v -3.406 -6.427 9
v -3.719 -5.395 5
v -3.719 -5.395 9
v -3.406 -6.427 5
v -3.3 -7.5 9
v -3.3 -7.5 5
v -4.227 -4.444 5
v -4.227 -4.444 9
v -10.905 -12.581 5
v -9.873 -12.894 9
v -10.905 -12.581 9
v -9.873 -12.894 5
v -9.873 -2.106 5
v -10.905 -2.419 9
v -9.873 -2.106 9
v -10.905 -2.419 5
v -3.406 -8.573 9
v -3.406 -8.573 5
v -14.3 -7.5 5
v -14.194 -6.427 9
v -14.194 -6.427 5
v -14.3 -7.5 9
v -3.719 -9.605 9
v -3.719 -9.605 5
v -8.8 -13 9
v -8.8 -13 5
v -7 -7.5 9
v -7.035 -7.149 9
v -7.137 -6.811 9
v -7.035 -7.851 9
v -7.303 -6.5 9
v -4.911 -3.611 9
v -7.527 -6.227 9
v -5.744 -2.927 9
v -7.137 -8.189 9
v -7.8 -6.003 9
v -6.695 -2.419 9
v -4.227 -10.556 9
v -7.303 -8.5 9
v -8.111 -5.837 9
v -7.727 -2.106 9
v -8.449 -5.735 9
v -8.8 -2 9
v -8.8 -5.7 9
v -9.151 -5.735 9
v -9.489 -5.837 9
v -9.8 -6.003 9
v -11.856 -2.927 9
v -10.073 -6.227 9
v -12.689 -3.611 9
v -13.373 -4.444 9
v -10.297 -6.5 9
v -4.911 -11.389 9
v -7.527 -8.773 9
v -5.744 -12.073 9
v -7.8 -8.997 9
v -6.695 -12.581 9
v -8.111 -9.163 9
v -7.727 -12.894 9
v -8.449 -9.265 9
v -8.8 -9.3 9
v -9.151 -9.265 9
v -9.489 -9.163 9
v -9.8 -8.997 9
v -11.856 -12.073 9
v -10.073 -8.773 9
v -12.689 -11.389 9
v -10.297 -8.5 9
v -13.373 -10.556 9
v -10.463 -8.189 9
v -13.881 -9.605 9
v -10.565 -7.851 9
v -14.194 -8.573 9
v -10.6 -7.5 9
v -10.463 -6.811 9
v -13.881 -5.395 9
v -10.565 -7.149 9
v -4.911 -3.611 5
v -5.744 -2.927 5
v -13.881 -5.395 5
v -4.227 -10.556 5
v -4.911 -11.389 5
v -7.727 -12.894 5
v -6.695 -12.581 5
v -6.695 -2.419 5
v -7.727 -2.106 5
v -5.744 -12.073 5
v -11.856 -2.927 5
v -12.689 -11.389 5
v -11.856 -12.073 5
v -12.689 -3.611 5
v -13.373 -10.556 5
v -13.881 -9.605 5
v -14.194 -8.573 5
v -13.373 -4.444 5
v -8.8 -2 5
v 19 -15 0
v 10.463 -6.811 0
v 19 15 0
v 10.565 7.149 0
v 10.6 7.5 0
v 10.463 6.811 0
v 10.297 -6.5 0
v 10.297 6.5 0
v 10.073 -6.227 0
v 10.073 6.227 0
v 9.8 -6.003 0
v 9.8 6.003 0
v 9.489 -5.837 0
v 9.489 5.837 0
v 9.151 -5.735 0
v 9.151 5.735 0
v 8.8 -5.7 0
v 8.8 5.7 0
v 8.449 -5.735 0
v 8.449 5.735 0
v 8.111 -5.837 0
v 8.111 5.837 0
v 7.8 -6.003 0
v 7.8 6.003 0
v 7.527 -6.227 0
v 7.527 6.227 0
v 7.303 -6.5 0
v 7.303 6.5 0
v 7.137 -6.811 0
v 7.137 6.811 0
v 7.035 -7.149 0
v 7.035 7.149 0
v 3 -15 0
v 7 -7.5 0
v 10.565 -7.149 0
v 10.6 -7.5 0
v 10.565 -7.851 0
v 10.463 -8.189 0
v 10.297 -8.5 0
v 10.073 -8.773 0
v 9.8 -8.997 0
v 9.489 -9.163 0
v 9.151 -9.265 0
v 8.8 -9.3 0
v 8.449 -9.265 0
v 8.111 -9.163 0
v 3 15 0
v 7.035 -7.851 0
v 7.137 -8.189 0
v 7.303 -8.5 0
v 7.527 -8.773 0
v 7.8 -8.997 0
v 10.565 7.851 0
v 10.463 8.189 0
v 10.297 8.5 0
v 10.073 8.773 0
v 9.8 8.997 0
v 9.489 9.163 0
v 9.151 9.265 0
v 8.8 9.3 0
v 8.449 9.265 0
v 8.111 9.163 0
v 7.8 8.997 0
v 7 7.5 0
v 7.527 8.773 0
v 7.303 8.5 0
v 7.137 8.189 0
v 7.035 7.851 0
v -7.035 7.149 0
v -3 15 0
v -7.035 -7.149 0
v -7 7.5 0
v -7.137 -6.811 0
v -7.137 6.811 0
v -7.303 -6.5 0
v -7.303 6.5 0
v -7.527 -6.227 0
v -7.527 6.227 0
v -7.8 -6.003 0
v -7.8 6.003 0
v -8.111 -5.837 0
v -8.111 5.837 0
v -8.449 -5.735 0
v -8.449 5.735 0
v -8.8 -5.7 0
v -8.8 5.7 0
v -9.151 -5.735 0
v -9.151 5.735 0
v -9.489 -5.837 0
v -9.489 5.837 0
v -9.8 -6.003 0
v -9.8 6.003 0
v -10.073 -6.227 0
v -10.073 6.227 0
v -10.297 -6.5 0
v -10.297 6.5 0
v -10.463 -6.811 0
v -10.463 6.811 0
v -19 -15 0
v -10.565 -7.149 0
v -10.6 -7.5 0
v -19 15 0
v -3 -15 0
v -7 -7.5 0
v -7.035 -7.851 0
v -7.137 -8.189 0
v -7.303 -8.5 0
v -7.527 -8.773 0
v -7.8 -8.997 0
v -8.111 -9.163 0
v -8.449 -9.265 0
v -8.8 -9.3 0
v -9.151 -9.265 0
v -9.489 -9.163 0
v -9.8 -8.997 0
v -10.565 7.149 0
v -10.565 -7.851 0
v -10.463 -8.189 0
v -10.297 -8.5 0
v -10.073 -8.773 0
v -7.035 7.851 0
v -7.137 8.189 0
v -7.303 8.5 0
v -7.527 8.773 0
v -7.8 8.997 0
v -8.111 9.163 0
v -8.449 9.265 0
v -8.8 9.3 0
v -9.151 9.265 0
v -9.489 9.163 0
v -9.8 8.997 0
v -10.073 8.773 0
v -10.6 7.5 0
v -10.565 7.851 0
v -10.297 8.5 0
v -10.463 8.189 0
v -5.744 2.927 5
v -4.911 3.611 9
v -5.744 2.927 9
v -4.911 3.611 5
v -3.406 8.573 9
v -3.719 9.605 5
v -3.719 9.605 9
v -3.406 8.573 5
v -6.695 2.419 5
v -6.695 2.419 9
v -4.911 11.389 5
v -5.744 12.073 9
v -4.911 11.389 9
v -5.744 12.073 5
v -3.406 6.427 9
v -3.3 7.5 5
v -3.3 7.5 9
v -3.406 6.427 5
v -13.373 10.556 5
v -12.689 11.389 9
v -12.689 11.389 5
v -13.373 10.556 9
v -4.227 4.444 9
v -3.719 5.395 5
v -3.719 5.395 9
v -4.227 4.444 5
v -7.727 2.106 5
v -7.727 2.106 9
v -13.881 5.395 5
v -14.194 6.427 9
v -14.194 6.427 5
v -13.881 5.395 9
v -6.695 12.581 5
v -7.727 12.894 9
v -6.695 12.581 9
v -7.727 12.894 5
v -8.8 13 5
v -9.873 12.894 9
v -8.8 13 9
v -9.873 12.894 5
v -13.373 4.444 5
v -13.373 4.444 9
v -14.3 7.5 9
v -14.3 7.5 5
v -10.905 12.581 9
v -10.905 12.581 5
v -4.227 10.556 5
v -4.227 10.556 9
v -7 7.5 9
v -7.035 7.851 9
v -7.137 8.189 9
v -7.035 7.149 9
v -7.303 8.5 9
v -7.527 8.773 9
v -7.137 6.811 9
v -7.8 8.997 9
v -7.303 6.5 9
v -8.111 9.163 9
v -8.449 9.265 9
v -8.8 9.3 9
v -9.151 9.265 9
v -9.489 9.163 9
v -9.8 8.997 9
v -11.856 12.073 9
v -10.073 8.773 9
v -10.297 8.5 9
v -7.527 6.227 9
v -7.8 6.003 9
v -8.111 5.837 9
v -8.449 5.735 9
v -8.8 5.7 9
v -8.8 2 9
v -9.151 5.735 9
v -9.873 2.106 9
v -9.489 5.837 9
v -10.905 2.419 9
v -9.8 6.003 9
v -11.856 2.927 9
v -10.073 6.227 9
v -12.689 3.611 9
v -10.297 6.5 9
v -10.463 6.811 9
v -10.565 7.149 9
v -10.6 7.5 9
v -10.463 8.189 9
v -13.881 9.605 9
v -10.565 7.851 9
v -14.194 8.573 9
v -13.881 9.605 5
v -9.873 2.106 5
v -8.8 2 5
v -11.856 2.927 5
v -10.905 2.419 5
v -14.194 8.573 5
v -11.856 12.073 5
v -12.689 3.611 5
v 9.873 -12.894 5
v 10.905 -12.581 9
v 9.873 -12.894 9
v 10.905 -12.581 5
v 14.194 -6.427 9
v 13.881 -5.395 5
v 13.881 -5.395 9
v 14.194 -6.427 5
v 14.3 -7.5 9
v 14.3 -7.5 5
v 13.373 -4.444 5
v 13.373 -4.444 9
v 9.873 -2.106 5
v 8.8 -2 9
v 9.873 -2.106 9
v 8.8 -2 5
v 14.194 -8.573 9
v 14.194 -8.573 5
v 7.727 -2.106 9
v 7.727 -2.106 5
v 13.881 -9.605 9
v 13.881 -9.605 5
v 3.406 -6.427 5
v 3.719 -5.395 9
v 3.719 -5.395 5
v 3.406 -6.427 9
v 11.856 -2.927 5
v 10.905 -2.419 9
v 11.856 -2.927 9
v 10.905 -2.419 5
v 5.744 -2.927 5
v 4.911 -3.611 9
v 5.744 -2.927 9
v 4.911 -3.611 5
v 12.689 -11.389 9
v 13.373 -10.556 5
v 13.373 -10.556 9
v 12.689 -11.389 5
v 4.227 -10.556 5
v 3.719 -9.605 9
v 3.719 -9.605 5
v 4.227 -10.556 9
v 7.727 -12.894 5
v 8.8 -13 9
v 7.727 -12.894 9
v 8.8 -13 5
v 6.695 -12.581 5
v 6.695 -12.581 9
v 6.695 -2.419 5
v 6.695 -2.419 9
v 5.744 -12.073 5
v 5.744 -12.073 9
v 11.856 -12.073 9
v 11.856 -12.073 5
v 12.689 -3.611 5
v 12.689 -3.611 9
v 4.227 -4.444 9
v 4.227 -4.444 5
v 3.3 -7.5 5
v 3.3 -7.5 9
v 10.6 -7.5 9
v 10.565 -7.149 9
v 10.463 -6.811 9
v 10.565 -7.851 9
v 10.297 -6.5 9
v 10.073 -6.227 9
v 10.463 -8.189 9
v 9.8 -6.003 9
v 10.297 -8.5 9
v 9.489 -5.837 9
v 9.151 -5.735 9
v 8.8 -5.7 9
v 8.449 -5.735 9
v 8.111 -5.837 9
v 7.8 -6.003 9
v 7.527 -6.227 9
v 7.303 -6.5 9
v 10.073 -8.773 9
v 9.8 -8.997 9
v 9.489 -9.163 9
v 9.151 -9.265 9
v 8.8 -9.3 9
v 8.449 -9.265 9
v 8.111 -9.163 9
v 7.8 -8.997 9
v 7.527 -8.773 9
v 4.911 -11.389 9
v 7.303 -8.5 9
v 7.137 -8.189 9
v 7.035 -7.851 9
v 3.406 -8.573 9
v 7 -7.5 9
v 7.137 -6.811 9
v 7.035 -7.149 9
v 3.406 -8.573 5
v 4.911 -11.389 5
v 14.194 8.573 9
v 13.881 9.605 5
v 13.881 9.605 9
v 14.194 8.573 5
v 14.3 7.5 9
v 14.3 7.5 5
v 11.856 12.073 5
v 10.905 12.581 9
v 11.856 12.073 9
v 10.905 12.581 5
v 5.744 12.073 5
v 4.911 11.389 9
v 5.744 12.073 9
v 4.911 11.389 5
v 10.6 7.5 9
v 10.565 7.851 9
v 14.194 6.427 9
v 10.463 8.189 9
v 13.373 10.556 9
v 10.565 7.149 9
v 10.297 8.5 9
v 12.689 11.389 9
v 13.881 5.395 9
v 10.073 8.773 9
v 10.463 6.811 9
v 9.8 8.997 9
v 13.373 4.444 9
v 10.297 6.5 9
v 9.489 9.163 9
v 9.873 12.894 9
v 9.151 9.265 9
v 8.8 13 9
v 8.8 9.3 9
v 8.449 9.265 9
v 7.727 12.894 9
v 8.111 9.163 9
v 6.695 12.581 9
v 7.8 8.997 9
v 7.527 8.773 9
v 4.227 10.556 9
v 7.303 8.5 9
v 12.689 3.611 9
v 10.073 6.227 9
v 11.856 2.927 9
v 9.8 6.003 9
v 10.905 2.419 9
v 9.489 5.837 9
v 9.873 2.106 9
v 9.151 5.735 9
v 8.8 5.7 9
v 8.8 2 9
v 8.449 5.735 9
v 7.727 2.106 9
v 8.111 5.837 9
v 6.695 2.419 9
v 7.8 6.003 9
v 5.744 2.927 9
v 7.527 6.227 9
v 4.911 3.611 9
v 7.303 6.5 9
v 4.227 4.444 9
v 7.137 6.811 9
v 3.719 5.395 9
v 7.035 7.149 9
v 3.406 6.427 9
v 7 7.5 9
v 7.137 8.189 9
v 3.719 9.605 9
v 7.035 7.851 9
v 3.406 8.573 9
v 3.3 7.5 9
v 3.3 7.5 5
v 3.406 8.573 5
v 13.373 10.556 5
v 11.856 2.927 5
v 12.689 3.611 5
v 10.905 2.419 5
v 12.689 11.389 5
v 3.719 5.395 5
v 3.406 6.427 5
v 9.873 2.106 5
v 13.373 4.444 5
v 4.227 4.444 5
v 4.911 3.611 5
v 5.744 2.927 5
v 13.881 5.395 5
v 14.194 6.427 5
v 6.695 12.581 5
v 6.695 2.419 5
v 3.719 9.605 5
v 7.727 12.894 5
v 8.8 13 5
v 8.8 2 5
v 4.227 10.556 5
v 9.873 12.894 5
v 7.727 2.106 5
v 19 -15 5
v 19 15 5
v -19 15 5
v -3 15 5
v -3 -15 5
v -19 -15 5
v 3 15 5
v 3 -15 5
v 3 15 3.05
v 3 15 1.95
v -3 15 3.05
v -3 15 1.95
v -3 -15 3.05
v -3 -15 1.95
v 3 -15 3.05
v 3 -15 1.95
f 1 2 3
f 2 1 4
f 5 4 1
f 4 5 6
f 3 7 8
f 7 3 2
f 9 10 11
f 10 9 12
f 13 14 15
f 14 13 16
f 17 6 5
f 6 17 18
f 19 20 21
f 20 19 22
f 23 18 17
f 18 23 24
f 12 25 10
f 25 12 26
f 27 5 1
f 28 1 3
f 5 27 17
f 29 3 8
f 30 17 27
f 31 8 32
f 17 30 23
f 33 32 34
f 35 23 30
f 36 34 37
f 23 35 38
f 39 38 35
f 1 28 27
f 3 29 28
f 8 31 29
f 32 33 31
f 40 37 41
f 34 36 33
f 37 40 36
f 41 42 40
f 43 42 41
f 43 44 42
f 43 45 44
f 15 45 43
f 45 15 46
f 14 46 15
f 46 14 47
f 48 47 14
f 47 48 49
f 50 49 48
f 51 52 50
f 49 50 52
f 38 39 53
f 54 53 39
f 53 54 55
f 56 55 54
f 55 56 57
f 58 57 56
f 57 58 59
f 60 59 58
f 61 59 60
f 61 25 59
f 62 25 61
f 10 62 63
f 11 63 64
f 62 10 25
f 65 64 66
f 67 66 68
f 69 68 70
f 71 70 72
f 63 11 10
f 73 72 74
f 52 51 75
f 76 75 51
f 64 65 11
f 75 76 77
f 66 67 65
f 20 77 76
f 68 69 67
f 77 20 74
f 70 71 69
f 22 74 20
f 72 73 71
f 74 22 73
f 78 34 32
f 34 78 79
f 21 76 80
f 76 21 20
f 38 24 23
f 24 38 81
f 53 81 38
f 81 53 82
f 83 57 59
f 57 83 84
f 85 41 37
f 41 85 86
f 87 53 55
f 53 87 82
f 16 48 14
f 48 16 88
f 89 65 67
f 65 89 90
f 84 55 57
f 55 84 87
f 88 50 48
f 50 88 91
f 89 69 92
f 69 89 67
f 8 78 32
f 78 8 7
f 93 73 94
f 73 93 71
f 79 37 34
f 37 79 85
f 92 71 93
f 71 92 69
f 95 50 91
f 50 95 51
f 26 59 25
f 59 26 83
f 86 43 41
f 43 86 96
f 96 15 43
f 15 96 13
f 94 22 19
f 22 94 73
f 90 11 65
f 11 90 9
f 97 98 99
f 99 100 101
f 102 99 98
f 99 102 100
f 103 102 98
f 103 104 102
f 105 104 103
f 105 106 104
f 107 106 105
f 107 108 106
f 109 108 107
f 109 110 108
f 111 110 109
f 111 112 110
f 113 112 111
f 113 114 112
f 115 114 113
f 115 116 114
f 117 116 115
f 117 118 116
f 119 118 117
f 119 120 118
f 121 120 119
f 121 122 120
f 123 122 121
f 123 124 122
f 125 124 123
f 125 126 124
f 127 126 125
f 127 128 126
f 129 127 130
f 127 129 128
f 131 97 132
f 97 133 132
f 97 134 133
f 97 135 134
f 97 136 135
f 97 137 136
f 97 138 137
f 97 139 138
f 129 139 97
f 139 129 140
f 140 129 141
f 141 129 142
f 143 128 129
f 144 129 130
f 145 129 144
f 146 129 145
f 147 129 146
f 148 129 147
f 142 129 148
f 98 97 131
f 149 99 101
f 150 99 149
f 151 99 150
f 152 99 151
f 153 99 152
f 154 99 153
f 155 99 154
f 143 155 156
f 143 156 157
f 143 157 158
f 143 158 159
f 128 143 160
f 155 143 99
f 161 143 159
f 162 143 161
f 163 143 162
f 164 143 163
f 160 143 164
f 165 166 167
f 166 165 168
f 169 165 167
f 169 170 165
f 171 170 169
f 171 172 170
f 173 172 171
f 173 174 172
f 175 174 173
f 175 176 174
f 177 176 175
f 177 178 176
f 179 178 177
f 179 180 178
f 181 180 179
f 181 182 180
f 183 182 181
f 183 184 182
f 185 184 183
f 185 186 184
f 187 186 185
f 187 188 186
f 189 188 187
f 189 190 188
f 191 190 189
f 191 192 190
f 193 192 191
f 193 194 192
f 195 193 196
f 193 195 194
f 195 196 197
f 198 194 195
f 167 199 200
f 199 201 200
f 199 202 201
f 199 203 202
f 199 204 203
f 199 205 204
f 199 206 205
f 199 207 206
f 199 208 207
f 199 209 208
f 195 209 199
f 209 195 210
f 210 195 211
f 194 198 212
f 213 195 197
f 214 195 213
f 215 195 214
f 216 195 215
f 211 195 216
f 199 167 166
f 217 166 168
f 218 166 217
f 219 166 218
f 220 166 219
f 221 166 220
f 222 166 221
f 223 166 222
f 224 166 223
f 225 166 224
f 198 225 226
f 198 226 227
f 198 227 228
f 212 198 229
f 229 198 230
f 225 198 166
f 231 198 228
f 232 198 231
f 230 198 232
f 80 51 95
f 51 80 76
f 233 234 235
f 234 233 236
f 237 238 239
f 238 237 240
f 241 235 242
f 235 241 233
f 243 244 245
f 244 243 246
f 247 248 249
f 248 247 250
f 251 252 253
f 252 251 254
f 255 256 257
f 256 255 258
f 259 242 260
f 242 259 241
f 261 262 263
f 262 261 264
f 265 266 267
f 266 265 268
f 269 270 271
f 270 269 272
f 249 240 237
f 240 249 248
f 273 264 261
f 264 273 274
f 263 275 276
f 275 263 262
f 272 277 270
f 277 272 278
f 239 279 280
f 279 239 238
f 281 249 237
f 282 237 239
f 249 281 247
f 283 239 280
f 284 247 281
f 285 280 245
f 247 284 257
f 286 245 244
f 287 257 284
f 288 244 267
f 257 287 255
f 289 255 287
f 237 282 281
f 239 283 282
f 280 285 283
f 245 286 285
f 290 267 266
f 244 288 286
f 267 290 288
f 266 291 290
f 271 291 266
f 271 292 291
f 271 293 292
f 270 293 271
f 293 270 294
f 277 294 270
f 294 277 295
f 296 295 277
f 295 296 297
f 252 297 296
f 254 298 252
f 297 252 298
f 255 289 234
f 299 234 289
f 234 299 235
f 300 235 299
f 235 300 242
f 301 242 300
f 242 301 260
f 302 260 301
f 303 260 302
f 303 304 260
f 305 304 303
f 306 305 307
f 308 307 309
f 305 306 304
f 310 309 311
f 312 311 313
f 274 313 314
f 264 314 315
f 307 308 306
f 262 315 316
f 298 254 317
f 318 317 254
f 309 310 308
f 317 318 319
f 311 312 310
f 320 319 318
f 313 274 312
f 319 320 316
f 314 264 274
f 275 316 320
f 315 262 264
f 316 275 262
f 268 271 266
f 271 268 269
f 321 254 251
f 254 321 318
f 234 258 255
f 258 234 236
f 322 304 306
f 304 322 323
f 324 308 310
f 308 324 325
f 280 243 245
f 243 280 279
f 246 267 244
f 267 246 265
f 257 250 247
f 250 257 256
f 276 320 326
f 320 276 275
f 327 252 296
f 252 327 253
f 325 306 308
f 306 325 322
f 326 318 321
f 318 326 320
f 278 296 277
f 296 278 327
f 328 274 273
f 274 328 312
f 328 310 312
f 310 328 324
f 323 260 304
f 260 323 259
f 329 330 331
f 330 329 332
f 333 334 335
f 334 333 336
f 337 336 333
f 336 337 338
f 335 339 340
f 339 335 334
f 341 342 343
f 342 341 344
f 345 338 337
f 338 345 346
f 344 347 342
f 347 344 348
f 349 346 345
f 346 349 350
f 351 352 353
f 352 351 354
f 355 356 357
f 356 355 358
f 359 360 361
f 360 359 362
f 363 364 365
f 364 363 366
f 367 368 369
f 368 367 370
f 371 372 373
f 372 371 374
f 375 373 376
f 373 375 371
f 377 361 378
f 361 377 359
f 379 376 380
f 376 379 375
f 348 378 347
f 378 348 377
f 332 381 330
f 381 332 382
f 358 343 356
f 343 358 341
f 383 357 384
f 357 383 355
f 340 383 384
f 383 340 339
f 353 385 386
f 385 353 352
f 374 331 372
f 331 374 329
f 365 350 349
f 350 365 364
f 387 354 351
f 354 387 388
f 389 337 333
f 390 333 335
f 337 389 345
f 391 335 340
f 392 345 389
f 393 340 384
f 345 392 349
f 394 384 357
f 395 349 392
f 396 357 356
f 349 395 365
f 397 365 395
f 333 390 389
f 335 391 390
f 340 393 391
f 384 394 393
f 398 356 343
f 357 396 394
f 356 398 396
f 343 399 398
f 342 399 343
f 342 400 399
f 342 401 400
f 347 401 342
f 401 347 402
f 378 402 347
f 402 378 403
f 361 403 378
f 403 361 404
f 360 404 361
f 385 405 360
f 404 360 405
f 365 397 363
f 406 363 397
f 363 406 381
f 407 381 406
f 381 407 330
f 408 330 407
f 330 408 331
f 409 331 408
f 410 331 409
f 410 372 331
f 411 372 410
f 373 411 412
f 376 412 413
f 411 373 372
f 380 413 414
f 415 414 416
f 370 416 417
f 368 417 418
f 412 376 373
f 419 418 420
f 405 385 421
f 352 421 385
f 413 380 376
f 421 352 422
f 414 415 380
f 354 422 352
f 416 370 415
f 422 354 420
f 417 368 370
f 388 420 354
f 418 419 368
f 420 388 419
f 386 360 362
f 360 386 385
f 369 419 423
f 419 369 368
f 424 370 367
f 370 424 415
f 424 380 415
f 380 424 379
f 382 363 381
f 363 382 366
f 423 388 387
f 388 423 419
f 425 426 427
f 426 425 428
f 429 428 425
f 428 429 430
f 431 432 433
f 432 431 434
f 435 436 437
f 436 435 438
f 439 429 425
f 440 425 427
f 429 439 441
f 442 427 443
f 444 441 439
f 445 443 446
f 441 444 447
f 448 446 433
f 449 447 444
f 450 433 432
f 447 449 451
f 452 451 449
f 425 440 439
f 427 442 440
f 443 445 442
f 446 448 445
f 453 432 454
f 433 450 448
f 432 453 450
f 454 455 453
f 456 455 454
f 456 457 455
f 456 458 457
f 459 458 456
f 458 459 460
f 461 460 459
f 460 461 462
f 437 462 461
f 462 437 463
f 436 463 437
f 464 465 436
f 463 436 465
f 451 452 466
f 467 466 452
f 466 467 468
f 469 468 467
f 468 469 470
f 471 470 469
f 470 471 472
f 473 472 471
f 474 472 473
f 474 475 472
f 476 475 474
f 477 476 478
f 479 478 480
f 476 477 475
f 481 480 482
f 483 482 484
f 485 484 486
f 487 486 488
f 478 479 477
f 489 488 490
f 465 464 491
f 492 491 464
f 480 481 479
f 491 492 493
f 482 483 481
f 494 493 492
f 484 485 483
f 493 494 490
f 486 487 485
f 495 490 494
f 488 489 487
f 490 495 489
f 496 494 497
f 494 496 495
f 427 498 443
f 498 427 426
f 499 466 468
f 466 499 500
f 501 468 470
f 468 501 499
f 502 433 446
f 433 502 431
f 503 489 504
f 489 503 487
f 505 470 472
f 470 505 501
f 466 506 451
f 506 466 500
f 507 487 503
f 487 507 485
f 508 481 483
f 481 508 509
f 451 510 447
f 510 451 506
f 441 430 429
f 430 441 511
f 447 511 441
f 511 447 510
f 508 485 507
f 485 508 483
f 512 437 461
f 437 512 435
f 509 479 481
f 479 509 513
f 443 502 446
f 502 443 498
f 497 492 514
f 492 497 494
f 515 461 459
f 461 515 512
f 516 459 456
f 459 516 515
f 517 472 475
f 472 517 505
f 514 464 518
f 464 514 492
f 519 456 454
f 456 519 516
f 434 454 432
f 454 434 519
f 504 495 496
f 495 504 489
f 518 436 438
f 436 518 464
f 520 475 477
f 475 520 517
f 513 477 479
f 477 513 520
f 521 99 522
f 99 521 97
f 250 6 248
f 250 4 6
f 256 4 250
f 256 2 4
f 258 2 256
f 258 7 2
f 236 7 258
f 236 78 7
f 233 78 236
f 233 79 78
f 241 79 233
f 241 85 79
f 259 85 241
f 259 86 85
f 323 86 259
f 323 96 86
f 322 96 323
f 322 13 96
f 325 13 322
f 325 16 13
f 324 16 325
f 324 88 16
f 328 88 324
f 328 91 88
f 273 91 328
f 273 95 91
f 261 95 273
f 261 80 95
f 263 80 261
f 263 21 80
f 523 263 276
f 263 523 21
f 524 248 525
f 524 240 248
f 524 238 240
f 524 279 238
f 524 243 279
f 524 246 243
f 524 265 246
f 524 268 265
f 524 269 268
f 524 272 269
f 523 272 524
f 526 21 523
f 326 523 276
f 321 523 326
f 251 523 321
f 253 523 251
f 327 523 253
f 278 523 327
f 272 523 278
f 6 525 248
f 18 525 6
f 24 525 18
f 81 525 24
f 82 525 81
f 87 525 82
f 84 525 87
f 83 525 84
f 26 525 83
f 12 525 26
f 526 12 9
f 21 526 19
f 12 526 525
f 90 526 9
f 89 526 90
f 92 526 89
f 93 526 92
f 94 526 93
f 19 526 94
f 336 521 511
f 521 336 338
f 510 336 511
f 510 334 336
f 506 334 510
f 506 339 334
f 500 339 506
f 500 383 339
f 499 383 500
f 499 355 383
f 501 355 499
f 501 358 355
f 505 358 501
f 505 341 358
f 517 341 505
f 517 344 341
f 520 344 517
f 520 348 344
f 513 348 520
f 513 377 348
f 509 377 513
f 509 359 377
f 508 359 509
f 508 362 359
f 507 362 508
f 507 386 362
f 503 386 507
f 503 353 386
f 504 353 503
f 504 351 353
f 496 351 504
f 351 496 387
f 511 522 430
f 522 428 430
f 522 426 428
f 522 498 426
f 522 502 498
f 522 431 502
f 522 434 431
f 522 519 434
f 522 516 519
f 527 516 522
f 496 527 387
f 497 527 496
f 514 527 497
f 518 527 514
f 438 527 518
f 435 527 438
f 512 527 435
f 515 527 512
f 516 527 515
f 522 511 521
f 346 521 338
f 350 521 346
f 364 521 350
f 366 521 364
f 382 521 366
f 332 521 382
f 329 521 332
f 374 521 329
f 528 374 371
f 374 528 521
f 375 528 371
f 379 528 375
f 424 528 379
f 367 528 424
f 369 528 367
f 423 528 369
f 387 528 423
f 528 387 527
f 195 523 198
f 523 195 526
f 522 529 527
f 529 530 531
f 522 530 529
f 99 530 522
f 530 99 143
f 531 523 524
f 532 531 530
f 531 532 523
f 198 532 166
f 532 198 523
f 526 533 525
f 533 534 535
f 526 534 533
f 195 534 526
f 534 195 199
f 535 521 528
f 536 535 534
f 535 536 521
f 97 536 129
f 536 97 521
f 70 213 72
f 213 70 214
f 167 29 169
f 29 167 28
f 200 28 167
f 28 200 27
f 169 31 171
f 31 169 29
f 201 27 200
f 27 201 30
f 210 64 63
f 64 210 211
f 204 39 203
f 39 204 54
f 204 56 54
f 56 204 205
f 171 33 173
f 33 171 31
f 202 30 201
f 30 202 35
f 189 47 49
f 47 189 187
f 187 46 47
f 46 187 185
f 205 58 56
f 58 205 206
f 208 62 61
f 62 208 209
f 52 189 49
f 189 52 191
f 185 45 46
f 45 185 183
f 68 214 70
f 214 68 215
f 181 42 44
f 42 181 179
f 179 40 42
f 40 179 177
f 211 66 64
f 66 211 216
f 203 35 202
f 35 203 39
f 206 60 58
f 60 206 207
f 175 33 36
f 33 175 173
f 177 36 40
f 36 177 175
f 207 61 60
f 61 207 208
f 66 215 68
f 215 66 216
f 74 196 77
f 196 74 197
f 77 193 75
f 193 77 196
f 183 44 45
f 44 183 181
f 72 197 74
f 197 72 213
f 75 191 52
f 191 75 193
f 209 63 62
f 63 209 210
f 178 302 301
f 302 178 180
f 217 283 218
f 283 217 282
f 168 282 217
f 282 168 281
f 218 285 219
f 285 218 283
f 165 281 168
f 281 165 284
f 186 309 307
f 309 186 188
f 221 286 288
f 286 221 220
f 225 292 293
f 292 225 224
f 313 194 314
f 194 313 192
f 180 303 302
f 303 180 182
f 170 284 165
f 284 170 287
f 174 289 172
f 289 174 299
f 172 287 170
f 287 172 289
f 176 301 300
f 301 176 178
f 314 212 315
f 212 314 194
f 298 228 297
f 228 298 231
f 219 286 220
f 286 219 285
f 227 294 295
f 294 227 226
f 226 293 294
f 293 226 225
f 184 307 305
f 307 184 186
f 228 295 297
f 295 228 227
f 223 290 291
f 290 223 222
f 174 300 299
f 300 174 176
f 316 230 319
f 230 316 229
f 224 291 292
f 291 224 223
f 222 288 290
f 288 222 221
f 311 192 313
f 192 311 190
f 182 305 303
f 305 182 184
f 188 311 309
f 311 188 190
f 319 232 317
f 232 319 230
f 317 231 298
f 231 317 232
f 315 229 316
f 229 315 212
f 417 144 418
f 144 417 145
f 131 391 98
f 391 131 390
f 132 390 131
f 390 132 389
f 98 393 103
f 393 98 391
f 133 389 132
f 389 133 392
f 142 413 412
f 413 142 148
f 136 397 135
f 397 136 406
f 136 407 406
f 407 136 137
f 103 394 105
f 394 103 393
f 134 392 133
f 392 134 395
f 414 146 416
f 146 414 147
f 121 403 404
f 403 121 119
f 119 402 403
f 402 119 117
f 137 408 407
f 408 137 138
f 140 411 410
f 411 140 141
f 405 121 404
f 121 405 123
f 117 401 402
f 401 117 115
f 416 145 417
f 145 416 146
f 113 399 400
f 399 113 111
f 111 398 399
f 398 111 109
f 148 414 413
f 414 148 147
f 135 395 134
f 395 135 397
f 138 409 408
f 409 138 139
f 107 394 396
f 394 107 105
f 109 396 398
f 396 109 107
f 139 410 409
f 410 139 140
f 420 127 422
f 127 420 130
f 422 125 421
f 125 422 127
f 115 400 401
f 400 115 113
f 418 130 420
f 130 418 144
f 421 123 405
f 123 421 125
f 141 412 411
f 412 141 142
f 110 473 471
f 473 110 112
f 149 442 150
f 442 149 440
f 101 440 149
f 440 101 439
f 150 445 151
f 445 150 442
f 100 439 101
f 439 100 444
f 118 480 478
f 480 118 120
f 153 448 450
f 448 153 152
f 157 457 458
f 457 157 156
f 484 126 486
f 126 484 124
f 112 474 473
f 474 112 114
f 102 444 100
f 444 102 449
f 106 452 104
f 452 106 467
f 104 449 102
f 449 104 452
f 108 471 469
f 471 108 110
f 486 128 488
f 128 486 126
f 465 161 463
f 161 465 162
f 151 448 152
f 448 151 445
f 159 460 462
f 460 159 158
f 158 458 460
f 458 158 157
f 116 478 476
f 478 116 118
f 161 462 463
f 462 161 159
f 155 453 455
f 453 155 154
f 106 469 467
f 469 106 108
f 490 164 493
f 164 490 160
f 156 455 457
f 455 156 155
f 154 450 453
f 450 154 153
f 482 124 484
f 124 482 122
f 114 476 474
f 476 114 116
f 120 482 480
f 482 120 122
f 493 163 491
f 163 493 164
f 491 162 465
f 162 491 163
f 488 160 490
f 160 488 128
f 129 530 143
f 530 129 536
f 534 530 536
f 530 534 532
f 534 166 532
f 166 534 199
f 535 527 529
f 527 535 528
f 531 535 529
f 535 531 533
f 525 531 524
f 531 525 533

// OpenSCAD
$fn = 32;

// ----------------------------------------------------------------------
// Living hinge: 38 x 30 mm plates, 1.1 mm flexible web
// ----------------------------------------------------------------------

// --- parameters (mm) ---
plate_len = 16;           // plate length outside the web
plate_w = 30;             // plate width
thick = 5;                // plate thickness
web_half = 3;             // half width of the flex band
web_t = 1.1;              // flexible web thickness
web_z = 1.95;             // web position inside the thickness
boss_d = 11;              // screw boss diameter
boss_h = 9;               // screw boss height
boss_x = 8.8;             // screw boss distance from the web
screw_d = 3.6;            // screw hole

difference() {
  union() {
    /* one flat strip, later thinned at the middle */
    translate([-19, -15, 0]) cube([38, 30, 5]);
    /* screw bosses, sunk 0.5 mm into the plates */
    for (sx = [-8.8, 8.8]) {
      for (sy = [-7.5, 7.5]) {
        translate([sx, sy, 0]) cylinder(h = boss_h, d = boss_d);
      }
    }
  }
  /* channel from below: leaves the web on top of it */
  translate([-3, -17.5, -2.5]) cube([6, 35, 4.45]);
  /* channel from above: thins the web down to web_t */
  translate([-3, -17.5, 3.05]) cube([6, 35, 4.45]);
  /* screw holes through the bosses */
  for (sx = [-8.8, 8.8]) {
    for (sy = [-7.5, 7.5]) {
      translate([sx, sy, -2.5]) cylinder(h = boss_h + 5, d = screw_d);
    }
  }
}
